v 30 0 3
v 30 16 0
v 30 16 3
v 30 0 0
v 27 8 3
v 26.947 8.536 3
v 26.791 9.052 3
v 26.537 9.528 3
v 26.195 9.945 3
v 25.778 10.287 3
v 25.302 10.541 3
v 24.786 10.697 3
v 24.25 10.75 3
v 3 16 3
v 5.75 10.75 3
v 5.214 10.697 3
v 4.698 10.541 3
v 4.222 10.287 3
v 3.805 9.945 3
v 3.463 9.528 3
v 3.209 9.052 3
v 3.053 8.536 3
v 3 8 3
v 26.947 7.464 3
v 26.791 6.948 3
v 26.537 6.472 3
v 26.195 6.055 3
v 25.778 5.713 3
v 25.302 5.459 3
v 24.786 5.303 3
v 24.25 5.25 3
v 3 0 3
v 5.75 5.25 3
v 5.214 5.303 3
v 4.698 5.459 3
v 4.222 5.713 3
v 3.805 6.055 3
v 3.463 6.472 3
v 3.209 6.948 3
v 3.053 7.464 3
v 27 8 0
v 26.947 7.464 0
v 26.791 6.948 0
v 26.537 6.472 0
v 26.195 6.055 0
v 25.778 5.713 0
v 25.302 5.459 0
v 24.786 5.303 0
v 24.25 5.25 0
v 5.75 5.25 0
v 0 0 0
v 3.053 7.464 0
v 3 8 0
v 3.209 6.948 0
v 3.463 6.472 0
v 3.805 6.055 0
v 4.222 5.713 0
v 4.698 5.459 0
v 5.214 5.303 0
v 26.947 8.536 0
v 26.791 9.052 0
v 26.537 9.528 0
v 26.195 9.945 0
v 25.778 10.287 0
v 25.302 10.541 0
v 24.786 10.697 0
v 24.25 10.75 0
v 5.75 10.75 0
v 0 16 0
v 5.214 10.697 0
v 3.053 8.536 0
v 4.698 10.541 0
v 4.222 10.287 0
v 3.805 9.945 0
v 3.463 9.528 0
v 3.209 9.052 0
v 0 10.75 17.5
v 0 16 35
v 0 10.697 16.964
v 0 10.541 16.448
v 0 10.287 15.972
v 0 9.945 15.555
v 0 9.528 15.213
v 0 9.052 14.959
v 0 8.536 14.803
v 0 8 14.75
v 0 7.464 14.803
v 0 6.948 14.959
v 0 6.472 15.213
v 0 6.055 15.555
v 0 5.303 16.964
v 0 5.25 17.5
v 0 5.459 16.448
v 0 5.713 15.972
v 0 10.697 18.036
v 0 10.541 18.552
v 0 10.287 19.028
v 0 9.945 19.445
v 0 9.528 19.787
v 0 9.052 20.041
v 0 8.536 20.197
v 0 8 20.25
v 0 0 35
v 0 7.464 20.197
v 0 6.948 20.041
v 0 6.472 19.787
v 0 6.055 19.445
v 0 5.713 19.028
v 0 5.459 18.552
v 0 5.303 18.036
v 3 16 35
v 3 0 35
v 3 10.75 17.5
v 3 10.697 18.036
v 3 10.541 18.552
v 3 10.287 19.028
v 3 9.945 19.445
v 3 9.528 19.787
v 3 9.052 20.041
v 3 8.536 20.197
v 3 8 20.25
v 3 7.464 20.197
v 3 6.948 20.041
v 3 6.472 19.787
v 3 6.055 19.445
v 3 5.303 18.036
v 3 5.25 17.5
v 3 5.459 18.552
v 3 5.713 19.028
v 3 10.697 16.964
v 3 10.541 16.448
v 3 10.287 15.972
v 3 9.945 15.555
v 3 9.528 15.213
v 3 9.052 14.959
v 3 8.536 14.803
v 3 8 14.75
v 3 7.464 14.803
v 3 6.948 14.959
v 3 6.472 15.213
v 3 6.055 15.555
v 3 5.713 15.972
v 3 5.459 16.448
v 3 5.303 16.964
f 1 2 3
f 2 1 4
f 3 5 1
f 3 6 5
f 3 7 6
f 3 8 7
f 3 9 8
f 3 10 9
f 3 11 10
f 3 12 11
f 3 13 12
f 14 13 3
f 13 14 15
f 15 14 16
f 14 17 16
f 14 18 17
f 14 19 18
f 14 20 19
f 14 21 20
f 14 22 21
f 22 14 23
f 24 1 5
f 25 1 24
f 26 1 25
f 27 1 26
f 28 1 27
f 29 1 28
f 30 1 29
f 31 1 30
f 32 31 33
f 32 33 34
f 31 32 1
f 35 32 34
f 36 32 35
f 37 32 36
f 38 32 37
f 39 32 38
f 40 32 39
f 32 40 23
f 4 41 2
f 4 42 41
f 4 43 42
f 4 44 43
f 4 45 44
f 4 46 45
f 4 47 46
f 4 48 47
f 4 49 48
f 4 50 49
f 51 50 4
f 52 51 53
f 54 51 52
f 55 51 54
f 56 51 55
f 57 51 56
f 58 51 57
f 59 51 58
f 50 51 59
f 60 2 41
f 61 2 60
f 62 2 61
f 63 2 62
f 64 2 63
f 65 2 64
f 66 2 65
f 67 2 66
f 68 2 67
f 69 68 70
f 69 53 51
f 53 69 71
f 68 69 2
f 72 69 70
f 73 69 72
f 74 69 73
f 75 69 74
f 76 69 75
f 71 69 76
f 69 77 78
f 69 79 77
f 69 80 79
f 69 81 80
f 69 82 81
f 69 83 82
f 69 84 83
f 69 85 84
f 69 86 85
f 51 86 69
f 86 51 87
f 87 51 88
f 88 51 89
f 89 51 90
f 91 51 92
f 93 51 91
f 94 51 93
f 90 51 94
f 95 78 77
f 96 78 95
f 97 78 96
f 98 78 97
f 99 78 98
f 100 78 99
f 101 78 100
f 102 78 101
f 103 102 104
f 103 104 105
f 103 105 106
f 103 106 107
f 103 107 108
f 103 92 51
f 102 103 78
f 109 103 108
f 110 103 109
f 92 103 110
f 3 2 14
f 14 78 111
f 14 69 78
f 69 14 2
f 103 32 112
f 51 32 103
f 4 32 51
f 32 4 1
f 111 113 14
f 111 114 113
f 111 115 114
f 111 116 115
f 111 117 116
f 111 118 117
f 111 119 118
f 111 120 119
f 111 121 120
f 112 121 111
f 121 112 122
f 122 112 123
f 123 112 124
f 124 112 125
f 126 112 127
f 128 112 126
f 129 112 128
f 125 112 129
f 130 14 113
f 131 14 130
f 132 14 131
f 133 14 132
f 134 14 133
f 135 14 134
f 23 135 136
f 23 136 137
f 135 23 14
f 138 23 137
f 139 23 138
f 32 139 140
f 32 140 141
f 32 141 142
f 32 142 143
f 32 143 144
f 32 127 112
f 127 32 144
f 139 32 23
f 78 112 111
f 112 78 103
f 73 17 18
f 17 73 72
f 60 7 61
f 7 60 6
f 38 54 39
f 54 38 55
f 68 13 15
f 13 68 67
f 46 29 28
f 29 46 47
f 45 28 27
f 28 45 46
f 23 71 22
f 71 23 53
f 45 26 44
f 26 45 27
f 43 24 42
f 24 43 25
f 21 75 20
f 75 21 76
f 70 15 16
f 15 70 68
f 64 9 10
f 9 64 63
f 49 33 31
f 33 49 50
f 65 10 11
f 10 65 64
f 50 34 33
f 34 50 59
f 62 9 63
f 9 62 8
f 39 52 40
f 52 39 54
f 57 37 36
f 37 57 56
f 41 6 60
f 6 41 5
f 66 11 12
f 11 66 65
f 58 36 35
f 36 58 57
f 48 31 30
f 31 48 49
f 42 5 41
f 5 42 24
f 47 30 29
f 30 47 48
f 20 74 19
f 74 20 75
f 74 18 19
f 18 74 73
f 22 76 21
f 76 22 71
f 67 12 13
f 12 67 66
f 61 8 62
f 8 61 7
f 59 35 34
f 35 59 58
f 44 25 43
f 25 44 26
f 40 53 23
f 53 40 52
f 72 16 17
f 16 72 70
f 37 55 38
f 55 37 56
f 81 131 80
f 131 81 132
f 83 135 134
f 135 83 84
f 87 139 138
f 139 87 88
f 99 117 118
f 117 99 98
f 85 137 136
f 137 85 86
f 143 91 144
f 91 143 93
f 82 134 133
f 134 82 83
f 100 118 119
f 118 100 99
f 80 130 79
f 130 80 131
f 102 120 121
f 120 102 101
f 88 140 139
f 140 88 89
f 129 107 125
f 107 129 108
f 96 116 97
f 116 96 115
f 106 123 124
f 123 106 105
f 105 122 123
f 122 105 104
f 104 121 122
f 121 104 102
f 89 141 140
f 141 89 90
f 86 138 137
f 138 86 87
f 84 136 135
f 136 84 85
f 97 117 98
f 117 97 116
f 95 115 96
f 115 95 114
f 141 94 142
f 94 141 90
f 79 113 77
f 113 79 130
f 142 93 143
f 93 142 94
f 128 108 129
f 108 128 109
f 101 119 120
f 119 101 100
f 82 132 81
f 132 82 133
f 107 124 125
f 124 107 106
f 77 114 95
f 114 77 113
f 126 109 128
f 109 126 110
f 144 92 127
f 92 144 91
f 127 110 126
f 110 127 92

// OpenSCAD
$fn = 32;

// ----------------------------------------------------------------------
// L-bracket: 30 x 16 x 35 mm
// ----------------------------------------------------------------------

// --- parameters (mm) ---
horiz_len = 30;           // horizontal leg, X
vert_len = 35;            // vertical leg, Z
profile_w = 16;           // bracket depth, Y
plate_t = 3;              // plate thickness
hole_d = 5.5;             // clearance for M5
slot_l = 24;              // adjustment slot length

module hole_z(px, py) {
  translate([px, py, -2.5]) cylinder(h = plate_t + 5, d = hole_d);
}
module hole_x(pz, py) {
  translate([-2.5, py, pz]) rotate([0, 90, 0]) cylinder(h = plate_t + 5, d = hole_d);
}
module adjust_slot(px, py) {
  hull() {
    translate([px - (slot_l - hole_d) / 2, py, -2.5]) cylinder(h = plate_t + 5, d = hole_d);
    translate([px + (slot_l - hole_d) / 2, py, -2.5]) cylinder(h = plate_t + 5, d = hole_d);
  }
}

difference() {
  union() {
    /* horizontal leg */
    cube([horiz_len, profile_w, plate_t]);
    /* vertical leg, overlapping the corner block */
    cube([plate_t, profile_w, vert_len]);
  }
  adjust_slot(15, 8);
  hole_x(17.5, 8);
}
